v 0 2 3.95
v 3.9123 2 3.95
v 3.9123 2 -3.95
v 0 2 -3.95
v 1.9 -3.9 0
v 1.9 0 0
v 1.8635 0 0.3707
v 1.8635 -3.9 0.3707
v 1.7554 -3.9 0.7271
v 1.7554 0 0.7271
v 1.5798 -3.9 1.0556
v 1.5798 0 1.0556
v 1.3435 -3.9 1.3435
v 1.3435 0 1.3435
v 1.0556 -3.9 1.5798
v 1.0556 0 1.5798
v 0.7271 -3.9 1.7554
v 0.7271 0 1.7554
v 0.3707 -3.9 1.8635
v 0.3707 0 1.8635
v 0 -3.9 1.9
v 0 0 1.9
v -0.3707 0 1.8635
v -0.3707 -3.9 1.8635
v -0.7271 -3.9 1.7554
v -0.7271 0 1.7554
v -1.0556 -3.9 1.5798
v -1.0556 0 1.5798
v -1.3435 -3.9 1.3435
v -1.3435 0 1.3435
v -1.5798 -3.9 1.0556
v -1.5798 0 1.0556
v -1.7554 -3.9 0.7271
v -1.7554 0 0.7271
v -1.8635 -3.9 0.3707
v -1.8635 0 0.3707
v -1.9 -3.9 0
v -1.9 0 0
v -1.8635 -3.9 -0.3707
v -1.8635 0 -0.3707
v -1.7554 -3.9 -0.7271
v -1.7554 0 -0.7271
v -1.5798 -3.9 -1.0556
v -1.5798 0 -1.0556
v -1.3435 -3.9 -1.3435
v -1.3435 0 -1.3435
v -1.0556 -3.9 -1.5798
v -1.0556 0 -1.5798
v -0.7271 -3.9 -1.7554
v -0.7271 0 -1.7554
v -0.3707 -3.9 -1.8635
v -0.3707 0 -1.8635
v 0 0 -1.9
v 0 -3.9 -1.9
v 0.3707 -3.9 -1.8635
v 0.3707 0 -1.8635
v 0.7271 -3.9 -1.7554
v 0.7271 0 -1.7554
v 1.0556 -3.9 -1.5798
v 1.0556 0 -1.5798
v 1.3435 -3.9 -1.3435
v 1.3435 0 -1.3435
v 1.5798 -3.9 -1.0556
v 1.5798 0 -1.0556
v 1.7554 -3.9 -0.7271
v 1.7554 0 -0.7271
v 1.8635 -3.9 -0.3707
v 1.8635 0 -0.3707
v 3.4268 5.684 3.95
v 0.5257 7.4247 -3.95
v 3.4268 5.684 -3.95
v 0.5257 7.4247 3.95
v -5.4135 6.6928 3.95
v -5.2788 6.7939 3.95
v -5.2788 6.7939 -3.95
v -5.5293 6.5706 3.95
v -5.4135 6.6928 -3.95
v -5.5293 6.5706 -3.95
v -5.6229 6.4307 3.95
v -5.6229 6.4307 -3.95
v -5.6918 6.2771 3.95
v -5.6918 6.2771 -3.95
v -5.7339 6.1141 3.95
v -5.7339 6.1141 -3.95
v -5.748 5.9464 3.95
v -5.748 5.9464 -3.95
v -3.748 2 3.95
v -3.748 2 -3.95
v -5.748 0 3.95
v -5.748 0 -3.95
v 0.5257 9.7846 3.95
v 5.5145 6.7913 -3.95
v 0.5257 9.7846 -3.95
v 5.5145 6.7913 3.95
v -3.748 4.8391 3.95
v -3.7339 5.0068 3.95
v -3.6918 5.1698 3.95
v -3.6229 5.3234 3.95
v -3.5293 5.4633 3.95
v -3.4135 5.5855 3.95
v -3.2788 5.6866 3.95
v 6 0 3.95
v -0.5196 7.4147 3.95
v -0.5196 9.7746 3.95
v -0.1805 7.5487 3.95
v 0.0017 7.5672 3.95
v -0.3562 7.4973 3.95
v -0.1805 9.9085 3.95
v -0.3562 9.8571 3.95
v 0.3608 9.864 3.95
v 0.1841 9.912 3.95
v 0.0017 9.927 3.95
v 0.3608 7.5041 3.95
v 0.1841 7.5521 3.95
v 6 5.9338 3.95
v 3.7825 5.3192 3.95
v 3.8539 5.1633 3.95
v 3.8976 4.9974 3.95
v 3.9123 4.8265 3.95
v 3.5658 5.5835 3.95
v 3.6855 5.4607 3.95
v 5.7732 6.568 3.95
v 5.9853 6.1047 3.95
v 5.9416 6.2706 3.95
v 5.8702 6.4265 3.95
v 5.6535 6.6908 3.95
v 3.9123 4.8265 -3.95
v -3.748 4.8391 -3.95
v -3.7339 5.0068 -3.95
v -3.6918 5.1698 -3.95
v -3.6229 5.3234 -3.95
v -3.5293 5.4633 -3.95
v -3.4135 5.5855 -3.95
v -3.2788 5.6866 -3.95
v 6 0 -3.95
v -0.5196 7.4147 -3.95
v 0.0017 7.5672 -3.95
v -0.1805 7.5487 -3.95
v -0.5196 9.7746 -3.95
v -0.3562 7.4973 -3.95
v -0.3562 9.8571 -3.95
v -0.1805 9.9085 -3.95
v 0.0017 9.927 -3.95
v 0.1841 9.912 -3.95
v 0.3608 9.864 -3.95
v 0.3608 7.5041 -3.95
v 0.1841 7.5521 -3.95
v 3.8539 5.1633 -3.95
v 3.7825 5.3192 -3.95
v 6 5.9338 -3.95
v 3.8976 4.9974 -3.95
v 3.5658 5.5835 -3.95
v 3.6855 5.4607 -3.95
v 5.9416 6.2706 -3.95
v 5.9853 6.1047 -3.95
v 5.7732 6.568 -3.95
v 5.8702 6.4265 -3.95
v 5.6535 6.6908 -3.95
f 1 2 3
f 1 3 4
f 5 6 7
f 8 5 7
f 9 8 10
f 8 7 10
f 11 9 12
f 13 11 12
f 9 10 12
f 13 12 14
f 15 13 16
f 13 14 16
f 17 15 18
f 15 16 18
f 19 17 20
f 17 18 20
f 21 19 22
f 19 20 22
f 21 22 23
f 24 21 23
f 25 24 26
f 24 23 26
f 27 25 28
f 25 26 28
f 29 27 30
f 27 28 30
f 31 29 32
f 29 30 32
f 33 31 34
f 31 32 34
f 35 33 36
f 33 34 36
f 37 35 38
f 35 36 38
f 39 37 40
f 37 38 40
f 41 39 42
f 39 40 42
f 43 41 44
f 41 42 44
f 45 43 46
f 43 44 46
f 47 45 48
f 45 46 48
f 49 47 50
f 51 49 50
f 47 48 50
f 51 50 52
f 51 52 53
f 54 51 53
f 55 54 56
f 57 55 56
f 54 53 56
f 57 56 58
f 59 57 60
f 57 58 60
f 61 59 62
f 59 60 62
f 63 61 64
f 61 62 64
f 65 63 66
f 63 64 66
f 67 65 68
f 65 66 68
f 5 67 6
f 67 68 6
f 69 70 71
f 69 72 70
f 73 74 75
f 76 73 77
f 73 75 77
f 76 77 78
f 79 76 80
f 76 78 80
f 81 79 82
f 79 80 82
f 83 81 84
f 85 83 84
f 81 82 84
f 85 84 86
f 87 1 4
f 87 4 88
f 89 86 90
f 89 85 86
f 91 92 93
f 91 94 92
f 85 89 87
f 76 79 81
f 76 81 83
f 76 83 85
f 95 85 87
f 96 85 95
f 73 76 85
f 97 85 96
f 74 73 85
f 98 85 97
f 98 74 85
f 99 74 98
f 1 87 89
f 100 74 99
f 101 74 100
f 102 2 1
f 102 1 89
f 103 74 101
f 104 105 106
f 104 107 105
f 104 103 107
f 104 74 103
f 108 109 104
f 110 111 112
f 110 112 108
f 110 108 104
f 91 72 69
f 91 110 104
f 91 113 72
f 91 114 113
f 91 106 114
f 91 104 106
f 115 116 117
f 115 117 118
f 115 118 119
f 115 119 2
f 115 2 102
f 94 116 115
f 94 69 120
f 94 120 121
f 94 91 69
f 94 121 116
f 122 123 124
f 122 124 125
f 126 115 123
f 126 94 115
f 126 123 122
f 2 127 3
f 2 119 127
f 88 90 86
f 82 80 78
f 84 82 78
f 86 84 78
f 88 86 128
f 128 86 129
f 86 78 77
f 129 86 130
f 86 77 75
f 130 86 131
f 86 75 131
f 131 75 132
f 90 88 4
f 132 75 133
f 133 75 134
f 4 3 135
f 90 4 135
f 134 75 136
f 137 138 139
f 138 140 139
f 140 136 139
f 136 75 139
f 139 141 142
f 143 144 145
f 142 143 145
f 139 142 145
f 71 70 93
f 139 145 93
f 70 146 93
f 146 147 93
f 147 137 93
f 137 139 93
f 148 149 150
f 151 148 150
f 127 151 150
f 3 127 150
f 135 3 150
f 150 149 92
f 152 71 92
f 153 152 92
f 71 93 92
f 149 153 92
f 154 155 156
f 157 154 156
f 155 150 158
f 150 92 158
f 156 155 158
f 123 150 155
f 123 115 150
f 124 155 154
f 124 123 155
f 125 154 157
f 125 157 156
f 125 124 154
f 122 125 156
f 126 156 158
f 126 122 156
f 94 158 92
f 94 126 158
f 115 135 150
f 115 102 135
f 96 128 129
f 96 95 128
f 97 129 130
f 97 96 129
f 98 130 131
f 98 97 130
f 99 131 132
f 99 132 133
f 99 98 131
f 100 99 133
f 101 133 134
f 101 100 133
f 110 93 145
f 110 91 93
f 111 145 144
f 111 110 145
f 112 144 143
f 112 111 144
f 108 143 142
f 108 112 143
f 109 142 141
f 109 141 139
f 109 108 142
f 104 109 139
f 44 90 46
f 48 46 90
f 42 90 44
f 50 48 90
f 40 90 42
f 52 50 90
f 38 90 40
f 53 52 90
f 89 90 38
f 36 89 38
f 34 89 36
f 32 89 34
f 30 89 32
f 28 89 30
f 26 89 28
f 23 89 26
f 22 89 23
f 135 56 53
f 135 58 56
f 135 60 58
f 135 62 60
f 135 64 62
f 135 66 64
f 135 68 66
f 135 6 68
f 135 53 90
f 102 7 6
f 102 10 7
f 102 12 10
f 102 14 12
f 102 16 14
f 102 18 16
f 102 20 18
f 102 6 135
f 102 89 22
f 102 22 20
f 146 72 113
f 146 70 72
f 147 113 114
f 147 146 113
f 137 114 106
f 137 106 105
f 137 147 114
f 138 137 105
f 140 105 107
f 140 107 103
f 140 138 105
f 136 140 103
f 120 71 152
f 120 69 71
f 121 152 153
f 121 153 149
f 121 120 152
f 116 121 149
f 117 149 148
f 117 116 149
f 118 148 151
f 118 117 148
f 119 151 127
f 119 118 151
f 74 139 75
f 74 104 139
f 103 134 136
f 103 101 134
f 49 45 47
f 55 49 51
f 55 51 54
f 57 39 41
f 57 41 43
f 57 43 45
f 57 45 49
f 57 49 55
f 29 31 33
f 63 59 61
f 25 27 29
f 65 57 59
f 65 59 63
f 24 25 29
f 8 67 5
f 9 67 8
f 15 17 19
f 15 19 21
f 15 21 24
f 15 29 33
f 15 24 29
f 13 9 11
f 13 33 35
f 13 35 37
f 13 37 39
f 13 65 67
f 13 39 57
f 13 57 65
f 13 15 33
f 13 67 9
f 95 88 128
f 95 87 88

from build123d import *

# Parameters (mm, degrees)
F1_DEPTH = 3.95
F2_R     = 1.9
F3_DEPTH = 3.9
F4_R     = 1


with BuildPart() as f1:
    # F0 (on Top) → F1 (new body, symmetric)
    with BuildSketch(Plane.XY):
        Polygon((0, 2.0000000475), (0, 0), (6, 0), (6, 6.5), (0, 10.1), (0, 7.740125583), (3.9123329981, 5.3927257842), (3.9123329981, 2), align=None)
        Polygon((-5.7480431453, 0), (0, 0), (0, 2.0000000475), (-3.7480431453, 2), (-3.7480431453, 5.3927257842), (0, 7.740125583), (0, 10.1), (-5.7480431453, 6.5), align=None)
    extrude(amount=F1_DEPTH, both=True)

    # F2 (on face) → F3 (join)
    with BuildSketch(Plane.XZ):
        Circle(F2_R)
    extrude(amount=F3_DEPTH)

    # F4
    f4_edges = [f1.edges().sort_by_distance(p)[0] for p in [
        (0, 10.1, 0),
        (-5.748043, 6.5, 0),
        (6, 6.5, 0),
        (-3.748043, 5.392726, 0),
        (3.912333, 5.392726, 0),
        (0, 7.740126, 0),
    ]]
    fillet(f4_edges, radius=F4_R)


solid = f1.part
